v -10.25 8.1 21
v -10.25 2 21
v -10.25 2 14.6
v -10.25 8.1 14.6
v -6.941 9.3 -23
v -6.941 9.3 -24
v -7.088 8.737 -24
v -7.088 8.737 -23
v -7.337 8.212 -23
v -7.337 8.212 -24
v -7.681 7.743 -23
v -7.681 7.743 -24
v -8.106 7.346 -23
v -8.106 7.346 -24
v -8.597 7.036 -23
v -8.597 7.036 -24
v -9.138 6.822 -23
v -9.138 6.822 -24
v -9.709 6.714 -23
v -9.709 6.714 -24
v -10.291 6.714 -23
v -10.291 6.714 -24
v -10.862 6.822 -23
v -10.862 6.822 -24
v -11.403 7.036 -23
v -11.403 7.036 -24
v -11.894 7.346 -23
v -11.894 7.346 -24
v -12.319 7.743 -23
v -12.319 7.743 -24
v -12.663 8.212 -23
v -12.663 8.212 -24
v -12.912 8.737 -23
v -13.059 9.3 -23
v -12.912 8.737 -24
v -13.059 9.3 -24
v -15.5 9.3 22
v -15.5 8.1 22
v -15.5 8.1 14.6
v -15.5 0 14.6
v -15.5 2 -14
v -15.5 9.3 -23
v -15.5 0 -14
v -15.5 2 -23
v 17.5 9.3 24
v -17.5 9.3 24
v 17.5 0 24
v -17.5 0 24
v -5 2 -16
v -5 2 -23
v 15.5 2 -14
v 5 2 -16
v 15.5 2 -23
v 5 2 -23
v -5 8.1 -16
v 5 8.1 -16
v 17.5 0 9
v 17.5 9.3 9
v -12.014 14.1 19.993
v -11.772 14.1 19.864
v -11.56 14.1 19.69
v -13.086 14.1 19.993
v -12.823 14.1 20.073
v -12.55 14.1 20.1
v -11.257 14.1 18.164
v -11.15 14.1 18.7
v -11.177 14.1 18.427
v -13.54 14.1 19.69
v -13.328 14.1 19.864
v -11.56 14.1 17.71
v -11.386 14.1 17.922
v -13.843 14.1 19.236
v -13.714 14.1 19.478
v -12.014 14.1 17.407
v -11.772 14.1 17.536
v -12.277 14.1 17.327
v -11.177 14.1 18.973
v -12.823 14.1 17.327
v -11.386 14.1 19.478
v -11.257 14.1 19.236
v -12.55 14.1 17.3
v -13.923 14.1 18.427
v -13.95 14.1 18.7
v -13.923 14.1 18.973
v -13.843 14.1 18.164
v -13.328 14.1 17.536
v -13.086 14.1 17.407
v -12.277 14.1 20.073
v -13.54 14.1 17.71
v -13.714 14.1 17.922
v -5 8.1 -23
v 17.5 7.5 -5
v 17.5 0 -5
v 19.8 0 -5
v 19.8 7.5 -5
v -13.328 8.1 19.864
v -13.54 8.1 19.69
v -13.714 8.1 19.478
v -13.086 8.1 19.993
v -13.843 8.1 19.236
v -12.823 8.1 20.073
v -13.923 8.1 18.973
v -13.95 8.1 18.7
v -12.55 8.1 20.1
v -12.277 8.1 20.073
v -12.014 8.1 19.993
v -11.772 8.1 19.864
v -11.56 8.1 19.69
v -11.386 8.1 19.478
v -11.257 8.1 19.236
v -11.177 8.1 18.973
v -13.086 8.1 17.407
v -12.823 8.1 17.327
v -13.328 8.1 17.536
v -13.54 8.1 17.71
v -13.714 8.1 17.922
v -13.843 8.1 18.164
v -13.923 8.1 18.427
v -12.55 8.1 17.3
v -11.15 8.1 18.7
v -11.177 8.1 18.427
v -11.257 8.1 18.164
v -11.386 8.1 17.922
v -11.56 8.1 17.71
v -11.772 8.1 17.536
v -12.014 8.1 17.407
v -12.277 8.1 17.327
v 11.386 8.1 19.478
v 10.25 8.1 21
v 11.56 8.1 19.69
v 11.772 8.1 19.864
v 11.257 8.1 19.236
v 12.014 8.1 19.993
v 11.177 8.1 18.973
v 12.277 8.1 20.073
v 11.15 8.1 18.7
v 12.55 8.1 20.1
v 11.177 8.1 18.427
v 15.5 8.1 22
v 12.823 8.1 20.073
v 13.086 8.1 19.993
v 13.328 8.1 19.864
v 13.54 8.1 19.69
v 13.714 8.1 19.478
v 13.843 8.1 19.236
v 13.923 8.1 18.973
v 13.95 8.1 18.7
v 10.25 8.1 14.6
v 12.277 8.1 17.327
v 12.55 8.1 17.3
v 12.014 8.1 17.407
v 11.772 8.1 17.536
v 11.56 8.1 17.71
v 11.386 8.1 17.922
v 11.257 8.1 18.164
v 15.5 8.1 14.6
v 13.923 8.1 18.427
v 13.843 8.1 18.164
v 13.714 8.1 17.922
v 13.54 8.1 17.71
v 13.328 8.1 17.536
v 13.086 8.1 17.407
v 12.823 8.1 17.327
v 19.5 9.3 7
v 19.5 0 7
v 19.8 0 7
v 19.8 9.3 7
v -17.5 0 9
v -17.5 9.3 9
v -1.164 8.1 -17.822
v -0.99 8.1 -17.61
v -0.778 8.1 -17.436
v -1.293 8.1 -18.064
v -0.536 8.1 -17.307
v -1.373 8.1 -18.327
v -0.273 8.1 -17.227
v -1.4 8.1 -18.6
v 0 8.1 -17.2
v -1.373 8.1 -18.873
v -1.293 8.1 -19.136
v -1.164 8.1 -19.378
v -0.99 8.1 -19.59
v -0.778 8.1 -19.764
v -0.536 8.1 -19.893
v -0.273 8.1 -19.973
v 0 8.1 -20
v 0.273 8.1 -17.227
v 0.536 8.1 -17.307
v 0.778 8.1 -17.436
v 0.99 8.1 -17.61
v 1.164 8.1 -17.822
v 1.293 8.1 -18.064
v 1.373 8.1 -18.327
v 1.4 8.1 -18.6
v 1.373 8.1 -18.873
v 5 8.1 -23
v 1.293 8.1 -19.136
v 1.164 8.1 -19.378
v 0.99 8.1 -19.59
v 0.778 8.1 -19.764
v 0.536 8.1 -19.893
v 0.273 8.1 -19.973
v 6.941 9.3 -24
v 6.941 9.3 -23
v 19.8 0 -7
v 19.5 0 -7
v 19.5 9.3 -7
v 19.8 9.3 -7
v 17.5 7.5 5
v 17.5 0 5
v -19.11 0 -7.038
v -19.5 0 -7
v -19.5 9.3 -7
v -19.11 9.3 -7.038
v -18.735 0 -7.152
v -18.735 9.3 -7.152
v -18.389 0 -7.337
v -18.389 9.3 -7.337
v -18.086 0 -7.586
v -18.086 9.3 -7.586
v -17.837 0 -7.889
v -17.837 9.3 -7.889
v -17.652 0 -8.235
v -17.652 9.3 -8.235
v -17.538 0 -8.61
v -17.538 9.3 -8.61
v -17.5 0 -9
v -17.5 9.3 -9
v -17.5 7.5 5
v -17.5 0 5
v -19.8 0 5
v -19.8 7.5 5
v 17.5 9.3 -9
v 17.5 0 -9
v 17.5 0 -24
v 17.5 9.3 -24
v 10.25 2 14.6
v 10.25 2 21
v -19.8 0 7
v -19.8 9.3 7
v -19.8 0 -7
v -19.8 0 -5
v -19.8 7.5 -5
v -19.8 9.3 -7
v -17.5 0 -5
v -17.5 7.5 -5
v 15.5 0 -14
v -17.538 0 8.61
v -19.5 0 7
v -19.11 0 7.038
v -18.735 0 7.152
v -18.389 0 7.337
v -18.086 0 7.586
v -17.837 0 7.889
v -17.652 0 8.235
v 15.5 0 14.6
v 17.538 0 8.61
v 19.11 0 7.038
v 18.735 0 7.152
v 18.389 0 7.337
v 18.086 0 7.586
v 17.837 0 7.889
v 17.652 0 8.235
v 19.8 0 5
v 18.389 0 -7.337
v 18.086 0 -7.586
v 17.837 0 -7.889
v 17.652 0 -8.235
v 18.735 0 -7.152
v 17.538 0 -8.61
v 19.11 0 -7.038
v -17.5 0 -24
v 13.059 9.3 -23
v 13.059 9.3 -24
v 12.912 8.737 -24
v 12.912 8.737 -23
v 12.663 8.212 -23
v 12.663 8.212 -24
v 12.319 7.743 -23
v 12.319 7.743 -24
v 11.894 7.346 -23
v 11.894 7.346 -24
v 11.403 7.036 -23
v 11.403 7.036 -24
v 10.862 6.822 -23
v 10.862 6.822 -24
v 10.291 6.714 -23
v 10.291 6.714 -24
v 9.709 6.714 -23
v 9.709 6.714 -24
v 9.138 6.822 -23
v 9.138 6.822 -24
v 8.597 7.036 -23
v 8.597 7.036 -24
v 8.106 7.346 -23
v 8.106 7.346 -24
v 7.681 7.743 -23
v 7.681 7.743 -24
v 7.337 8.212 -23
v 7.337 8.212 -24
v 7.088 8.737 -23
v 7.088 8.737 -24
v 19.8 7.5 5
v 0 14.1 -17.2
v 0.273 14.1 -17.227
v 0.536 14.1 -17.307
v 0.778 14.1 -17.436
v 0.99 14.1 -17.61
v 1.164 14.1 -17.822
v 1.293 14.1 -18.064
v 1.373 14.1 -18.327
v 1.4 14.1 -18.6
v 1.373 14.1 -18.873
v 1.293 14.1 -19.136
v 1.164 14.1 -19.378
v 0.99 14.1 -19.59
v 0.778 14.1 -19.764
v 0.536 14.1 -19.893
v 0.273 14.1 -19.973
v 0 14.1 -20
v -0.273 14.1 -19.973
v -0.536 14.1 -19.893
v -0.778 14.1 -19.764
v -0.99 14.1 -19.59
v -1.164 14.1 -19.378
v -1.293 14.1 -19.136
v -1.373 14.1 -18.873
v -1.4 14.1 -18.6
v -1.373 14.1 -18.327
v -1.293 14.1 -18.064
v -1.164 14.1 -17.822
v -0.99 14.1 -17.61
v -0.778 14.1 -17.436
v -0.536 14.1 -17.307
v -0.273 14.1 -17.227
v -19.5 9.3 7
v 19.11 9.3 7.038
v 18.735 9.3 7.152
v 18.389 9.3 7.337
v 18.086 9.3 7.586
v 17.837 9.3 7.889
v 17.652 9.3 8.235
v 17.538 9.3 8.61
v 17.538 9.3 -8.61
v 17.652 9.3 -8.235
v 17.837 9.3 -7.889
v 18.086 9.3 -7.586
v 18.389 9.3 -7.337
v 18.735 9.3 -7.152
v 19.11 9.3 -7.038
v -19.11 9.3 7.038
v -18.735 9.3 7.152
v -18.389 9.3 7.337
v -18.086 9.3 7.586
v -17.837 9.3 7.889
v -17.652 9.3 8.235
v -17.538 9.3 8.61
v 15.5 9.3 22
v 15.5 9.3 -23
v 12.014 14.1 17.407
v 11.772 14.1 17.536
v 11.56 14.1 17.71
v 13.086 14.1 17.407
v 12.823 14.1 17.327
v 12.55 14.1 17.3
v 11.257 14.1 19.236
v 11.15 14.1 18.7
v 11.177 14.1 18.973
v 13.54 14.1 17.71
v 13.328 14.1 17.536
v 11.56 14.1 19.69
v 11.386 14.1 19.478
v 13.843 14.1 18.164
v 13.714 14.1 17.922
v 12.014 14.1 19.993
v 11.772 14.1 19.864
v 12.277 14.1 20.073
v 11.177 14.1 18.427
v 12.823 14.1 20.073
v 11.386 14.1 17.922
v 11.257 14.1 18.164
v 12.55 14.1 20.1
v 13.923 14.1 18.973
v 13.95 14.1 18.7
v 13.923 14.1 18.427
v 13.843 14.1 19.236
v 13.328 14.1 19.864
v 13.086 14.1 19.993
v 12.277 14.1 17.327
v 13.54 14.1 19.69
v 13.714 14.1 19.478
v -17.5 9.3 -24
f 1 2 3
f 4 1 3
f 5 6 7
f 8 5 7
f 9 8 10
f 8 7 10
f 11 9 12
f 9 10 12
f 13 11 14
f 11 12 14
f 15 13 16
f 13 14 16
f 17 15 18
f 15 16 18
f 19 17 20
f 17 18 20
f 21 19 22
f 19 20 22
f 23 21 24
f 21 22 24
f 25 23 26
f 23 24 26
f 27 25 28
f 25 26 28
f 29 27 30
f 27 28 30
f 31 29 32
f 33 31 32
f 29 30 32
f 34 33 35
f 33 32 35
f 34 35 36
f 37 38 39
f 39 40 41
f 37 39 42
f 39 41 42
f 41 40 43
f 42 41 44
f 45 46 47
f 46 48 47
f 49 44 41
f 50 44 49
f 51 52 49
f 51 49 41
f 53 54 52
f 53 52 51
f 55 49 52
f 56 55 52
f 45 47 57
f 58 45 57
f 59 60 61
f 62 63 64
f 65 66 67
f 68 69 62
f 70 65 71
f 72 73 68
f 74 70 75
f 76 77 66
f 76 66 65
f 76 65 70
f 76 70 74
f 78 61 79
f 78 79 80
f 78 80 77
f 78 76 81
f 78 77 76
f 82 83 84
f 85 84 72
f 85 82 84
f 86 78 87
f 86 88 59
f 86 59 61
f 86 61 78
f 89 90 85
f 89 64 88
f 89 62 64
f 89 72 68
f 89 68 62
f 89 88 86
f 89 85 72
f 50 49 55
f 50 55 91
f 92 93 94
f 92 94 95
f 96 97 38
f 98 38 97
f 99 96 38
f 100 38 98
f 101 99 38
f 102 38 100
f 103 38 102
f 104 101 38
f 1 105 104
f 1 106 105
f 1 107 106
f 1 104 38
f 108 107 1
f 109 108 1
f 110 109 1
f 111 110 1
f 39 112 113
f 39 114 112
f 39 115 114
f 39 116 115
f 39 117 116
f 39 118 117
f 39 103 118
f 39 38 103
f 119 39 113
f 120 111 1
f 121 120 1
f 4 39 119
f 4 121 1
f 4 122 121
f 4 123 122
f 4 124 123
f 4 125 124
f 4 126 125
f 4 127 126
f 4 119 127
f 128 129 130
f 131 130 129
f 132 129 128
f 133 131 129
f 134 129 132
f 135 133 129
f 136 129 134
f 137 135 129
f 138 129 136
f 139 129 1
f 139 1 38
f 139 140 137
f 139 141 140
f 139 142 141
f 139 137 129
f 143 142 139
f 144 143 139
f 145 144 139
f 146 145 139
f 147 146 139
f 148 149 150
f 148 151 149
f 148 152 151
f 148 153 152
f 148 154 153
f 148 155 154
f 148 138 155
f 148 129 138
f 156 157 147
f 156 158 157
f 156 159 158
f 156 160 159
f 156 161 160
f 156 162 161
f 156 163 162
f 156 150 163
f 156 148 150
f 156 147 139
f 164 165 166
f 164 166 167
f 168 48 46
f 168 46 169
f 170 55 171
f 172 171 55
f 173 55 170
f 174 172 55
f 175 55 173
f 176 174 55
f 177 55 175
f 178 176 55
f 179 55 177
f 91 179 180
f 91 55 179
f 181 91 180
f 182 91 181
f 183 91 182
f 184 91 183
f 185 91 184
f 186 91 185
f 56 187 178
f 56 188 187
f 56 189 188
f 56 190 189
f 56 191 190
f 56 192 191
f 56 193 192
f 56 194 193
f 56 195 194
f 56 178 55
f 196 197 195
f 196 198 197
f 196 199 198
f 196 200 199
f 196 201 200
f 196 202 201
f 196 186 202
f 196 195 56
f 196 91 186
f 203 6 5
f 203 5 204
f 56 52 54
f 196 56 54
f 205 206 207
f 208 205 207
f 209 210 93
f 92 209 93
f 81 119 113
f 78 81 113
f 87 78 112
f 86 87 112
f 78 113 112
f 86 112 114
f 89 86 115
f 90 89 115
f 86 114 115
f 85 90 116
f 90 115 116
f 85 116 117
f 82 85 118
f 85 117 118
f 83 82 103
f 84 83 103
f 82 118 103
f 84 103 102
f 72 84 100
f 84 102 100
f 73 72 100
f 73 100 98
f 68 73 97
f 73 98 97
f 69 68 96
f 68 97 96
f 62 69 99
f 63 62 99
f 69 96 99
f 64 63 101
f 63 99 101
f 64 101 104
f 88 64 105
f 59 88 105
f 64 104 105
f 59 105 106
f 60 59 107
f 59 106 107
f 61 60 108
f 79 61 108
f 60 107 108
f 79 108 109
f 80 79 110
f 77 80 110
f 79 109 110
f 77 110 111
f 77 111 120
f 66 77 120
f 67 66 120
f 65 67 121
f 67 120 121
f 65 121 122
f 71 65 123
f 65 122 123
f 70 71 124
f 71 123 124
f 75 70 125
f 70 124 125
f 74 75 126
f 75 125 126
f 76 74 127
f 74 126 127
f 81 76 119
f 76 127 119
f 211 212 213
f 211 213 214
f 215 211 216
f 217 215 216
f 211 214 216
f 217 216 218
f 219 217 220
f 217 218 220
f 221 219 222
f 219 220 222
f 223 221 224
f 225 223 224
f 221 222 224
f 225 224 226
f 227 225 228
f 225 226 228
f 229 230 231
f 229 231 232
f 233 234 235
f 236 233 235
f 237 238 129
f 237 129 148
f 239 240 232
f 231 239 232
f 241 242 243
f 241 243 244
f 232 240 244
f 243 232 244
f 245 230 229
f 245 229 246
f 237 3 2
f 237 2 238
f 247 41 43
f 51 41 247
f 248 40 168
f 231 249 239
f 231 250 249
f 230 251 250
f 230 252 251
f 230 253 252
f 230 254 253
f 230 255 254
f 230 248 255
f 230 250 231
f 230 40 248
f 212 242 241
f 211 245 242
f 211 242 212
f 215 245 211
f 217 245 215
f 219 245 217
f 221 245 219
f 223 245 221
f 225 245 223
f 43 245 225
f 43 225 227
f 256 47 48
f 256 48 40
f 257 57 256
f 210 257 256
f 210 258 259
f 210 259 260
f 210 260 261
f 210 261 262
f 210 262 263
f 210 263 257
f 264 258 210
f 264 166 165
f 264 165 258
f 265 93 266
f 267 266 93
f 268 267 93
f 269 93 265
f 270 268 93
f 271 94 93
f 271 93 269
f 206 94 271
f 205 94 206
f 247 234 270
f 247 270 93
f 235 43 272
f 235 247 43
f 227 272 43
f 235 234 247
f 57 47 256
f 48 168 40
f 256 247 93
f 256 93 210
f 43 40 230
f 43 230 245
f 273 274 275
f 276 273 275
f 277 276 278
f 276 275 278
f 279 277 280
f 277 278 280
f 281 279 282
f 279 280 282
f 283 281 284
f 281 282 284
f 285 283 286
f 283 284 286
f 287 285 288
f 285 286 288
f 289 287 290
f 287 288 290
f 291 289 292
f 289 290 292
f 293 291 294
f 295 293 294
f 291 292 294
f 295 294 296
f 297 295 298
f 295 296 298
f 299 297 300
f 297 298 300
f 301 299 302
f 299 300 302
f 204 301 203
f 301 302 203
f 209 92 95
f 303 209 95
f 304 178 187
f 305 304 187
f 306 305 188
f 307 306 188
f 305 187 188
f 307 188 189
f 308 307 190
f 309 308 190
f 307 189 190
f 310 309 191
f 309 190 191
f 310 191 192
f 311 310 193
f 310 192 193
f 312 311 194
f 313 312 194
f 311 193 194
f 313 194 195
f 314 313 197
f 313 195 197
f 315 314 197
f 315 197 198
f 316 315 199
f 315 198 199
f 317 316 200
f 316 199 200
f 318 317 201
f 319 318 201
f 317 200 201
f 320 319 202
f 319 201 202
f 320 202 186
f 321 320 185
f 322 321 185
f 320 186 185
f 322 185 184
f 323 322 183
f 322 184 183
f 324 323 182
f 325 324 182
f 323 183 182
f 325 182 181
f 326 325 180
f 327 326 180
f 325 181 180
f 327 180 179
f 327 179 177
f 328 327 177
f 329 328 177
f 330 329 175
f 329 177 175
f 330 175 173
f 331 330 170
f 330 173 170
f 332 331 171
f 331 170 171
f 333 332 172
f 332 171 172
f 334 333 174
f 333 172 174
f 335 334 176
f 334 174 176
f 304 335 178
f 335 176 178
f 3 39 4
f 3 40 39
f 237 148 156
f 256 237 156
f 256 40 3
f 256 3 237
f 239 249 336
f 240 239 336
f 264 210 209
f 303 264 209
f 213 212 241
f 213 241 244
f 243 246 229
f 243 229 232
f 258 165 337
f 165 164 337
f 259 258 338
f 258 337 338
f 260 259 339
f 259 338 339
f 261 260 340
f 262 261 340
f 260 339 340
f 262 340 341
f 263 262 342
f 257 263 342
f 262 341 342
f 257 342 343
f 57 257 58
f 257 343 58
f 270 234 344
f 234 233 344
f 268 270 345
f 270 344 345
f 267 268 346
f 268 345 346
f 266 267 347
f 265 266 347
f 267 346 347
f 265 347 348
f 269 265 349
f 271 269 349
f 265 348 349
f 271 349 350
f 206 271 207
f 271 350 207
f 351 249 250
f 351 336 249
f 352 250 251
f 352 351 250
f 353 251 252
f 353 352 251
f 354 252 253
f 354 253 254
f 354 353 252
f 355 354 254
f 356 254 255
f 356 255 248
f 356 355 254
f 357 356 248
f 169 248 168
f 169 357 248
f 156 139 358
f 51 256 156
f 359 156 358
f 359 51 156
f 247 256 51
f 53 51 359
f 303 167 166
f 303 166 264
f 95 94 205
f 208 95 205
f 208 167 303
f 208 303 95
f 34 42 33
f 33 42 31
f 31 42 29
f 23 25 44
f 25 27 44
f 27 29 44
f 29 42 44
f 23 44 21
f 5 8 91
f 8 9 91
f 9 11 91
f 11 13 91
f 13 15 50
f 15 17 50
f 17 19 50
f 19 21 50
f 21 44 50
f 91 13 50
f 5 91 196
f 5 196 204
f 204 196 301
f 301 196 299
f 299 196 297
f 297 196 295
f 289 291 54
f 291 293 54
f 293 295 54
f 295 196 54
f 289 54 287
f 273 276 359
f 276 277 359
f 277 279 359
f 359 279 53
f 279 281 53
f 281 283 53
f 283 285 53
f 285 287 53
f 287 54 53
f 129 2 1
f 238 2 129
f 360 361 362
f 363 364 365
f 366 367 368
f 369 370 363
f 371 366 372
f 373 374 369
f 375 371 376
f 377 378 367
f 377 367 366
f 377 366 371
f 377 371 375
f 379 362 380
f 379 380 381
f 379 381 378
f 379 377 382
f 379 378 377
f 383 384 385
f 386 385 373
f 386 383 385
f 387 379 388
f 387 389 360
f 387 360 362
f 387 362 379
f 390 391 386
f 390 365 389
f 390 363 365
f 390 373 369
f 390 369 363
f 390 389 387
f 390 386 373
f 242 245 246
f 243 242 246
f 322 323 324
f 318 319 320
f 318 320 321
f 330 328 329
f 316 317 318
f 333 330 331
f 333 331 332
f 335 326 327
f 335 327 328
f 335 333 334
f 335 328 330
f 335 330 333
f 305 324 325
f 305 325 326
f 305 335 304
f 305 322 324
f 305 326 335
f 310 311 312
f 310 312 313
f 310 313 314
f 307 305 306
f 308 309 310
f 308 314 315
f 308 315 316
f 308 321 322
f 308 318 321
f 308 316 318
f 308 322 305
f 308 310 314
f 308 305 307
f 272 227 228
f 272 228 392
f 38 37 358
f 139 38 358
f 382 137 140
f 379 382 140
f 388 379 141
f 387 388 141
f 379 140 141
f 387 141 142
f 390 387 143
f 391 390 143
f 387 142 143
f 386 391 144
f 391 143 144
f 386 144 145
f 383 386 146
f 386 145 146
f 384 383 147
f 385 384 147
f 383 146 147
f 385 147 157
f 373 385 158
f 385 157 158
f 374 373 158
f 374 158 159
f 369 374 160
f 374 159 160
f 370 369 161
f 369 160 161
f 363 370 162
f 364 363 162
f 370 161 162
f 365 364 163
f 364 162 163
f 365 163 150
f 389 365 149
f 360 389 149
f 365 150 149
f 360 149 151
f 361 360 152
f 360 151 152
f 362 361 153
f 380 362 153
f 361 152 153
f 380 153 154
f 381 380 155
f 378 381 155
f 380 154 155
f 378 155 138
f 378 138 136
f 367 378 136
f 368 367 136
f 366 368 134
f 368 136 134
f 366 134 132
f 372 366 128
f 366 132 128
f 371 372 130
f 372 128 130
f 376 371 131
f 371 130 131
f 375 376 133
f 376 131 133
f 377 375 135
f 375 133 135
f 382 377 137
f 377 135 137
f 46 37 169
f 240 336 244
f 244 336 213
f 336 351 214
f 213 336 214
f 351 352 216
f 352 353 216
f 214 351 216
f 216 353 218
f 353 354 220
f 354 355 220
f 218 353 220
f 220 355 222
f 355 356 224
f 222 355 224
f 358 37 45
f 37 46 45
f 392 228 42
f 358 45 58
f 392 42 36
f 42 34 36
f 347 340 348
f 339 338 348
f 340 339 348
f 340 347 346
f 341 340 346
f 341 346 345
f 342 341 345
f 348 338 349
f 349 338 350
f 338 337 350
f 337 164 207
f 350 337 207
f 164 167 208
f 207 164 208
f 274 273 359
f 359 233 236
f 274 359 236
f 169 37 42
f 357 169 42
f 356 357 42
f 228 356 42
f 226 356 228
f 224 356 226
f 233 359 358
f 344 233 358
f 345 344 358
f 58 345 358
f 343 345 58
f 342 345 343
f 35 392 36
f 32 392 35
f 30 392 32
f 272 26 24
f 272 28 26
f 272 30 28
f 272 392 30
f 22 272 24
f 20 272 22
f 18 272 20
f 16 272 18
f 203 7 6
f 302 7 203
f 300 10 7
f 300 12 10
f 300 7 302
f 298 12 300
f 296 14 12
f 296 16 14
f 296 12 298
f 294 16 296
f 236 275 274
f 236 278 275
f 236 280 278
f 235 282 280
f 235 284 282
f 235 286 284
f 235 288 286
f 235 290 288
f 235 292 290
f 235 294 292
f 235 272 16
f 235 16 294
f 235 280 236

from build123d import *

# Parameters (mm, degrees)
SKETCH1_W           = 35
SKETCH1_H           = 48
BOSS_EXTRUDE1_DEPTH = 2
SKETCH2_W           = 35
SKETCH2_H           = 48
SKETCH2_W_2         = 31
SKETCH2_H_2         = 44
BOSS_EXTRUDE2_DEPTH = 7.3
SKETCH3_W           = 10
SKETCH3_H           = 7
SKETCH3_W_2         = 5.25
SKETCH3_H_2         = 6.4
BOSS_EXTRUDE3_DEPTH = 6.1
CUT_EXTRUDE5_DEPTH  = 1
SKETCH10_W          = 31
SKETCH10_H          = 28.6
CUT_EXTRUDE6_DEPTH  = 31.586598372
BOSS_EXTRUDE4_START = 8.1
SKETCH8_R           = 1.4
BOSS_EXTRUDE4_DEPTH = 6
SKETCH14_W          = 2.3
SKETCH14_H          = 1.8
BOSS_EXTRUDE6_DEPTH = 5
SKETCH15_W          = 2
SKETCH15_H          = 9.3
BOSS_EXTRUDE7_DEPTH = 2.3
FILLET3_R           = 2
SKETCH16_W          = 31
SKETCH16_H          = 1
CUT_EXTRUDE8_DEPTH  = 1.2


with BuildPart() as part:
    # Sketch1 → Boss-Extrude1 (new body)
    with BuildSketch(Plane(origin=(0, 0, 0), x_dir=(1, 0, 0), z_dir=(0, 1, 0))):
        Rectangle(SKETCH1_W, SKETCH1_H)
    extrude(amount=BOSS_EXTRUDE1_DEPTH)

    # Sketch2 → Boss-Extrude2 (add)
    with BuildSketch(Plane(origin=(0, 2, 0), x_dir=(1, 0, 0), z_dir=(0, 1, 0))):
        Rectangle(SKETCH2_W, SKETCH2_H)
        with Locations((0, 1)):
            Rectangle(SKETCH2_W_2, SKETCH2_H_2, mode=Mode.SUBTRACT)
    extrude(amount=BOSS_EXTRUDE2_DEPTH)

    # Sketch3 → Boss-Extrude3 (add)
    with BuildSketch(Plane(origin=(0, 2, 0), x_dir=(1, 0, 0), z_dir=(0, 1, 0))):
        with Locations((0, 19.5)):
            Rectangle(SKETCH3_W, SKETCH3_H)
        with Locations((-12.875, -17.8)):
            Rectangle(SKETCH3_W_2, SKETCH3_H_2)
        with Locations((12.875, -17.8)):
            Rectangle(SKETCH3_W_2, SKETCH3_H_2)
    extrude(amount=BOSS_EXTRUDE3_DEPTH)

    # Sketch6 → Cut-Extrude5 (cut)
    with BuildSketch(Plane(origin=(0, 0, -24), x_dir=(-1, 0, 0), z_dir=(0, 0, -1))):
        with BuildLine():
            ThreePointArc((-13.059411708, 9.3), (-10, 6.7), (-6.940588292, 9.3))
            Line((-6.940588292, 9.3), (-13.059411708, 9.3))
        make_face()
        with BuildLine():
            Line((13.059411708, 9.3), (6.940588292, 9.3))
            ThreePointArc((6.940588292, 9.3), (10, 6.7), (13.059411708, 9.3))
        make_face()
    extrude(amount=-CUT_EXTRUDE5_DEPTH, mode=Mode.SUBTRACT)

    # Sketch10 → Cut-Extrude6 (cut, through all)
    with BuildSketch(Plane(origin=(0, 2, 0), x_dir=(1, 0, 0), z_dir=(0, 1, 0))):
        with Locations((0, -0.3)):
            Rectangle(SKETCH10_W, SKETCH10_H)
    extrude(amount=-CUT_EXTRUDE6_DEPTH, mode=Mode.SUBTRACT)

    # Sketch8 → Boss-Extrude4 (add)
    with BuildSketch(Plane(origin=(0, 0, 0), x_dir=(1, 0, 0), z_dir=(0, 1, 0)).offset(BOSS_EXTRUDE4_START)):
        with Locations(Location((-12.55, -18.7, 0), (0, 0, 90))):
            Circle(SKETCH8_R)
        with Locations(Location((12.55, -18.7, 0), (0, 0, 270))):
            Circle(SKETCH8_R)
        with Locations(Location((0, 18.6, 0), (0, 0, 270))):
            Circle(SKETCH8_R)
    extrude(amount=BOSS_EXTRUDE4_DEPTH)

    # Sketch14 → Boss-Extrude6 (add, symmetric)
    with BuildSketch(Plane.XY):
        with Locations((18.65, 8.4)):
            Rectangle(SKETCH14_W, SKETCH14_H)
    boss_extrude6 = extrude(amount=BOSS_EXTRUDE6_DEPTH, both=True)

    # Sketch15 → Boss-Extrude7 (add)
    with BuildSketch(Plane(origin=(17.5, 0, 0), x_dir=(0, 0, -1), z_dir=(1, 0, 0))):
        with Locations((-6, 4.65)):
            Rectangle(SKETCH15_W, SKETCH15_H)
        with Locations((6, 4.65)):
            Rectangle(SKETCH15_W, SKETCH15_H)
    boss_extrude7 = extrude(amount=BOSS_EXTRUDE7_DEPTH)

    # Mirror3: Boss-Extrude6, Boss-Extrude7 across plane
    add(boss_extrude6.mirror(Plane(origin=(0, 0, 0), x_dir=(0, 0, 1), z_dir=(1, 0, 0))))
    add(boss_extrude7.mirror(Plane(origin=(0, 0, 0), x_dir=(0, 0, 1), z_dir=(1, 0, 0))))

    # Fillet3
    fillet3_edges = [part.edges().sort_by_distance(p)[0] for p in [
        (17.5, 4.65, 7),
        (17.5, 4.65, -7),
        (-17.5, 4.65, 7),
        (-17.5, 4.65, -7),
    ]]
    fillet(fillet3_edges, radius=FILLET3_R)

    # Sketch16 → Cut-Extrude8 (cut)
    with BuildSketch(Plane(origin=(0, 9.3, 0), x_dir=(1, 0, 0), z_dir=(0, 1, 0))):
        with Locations((0, -21.5)):
            Rectangle(SKETCH16_W, SKETCH16_H)
    extrude(amount=-CUT_EXTRUDE8_DEPTH, mode=Mode.SUBTRACT)


solid = part.part
